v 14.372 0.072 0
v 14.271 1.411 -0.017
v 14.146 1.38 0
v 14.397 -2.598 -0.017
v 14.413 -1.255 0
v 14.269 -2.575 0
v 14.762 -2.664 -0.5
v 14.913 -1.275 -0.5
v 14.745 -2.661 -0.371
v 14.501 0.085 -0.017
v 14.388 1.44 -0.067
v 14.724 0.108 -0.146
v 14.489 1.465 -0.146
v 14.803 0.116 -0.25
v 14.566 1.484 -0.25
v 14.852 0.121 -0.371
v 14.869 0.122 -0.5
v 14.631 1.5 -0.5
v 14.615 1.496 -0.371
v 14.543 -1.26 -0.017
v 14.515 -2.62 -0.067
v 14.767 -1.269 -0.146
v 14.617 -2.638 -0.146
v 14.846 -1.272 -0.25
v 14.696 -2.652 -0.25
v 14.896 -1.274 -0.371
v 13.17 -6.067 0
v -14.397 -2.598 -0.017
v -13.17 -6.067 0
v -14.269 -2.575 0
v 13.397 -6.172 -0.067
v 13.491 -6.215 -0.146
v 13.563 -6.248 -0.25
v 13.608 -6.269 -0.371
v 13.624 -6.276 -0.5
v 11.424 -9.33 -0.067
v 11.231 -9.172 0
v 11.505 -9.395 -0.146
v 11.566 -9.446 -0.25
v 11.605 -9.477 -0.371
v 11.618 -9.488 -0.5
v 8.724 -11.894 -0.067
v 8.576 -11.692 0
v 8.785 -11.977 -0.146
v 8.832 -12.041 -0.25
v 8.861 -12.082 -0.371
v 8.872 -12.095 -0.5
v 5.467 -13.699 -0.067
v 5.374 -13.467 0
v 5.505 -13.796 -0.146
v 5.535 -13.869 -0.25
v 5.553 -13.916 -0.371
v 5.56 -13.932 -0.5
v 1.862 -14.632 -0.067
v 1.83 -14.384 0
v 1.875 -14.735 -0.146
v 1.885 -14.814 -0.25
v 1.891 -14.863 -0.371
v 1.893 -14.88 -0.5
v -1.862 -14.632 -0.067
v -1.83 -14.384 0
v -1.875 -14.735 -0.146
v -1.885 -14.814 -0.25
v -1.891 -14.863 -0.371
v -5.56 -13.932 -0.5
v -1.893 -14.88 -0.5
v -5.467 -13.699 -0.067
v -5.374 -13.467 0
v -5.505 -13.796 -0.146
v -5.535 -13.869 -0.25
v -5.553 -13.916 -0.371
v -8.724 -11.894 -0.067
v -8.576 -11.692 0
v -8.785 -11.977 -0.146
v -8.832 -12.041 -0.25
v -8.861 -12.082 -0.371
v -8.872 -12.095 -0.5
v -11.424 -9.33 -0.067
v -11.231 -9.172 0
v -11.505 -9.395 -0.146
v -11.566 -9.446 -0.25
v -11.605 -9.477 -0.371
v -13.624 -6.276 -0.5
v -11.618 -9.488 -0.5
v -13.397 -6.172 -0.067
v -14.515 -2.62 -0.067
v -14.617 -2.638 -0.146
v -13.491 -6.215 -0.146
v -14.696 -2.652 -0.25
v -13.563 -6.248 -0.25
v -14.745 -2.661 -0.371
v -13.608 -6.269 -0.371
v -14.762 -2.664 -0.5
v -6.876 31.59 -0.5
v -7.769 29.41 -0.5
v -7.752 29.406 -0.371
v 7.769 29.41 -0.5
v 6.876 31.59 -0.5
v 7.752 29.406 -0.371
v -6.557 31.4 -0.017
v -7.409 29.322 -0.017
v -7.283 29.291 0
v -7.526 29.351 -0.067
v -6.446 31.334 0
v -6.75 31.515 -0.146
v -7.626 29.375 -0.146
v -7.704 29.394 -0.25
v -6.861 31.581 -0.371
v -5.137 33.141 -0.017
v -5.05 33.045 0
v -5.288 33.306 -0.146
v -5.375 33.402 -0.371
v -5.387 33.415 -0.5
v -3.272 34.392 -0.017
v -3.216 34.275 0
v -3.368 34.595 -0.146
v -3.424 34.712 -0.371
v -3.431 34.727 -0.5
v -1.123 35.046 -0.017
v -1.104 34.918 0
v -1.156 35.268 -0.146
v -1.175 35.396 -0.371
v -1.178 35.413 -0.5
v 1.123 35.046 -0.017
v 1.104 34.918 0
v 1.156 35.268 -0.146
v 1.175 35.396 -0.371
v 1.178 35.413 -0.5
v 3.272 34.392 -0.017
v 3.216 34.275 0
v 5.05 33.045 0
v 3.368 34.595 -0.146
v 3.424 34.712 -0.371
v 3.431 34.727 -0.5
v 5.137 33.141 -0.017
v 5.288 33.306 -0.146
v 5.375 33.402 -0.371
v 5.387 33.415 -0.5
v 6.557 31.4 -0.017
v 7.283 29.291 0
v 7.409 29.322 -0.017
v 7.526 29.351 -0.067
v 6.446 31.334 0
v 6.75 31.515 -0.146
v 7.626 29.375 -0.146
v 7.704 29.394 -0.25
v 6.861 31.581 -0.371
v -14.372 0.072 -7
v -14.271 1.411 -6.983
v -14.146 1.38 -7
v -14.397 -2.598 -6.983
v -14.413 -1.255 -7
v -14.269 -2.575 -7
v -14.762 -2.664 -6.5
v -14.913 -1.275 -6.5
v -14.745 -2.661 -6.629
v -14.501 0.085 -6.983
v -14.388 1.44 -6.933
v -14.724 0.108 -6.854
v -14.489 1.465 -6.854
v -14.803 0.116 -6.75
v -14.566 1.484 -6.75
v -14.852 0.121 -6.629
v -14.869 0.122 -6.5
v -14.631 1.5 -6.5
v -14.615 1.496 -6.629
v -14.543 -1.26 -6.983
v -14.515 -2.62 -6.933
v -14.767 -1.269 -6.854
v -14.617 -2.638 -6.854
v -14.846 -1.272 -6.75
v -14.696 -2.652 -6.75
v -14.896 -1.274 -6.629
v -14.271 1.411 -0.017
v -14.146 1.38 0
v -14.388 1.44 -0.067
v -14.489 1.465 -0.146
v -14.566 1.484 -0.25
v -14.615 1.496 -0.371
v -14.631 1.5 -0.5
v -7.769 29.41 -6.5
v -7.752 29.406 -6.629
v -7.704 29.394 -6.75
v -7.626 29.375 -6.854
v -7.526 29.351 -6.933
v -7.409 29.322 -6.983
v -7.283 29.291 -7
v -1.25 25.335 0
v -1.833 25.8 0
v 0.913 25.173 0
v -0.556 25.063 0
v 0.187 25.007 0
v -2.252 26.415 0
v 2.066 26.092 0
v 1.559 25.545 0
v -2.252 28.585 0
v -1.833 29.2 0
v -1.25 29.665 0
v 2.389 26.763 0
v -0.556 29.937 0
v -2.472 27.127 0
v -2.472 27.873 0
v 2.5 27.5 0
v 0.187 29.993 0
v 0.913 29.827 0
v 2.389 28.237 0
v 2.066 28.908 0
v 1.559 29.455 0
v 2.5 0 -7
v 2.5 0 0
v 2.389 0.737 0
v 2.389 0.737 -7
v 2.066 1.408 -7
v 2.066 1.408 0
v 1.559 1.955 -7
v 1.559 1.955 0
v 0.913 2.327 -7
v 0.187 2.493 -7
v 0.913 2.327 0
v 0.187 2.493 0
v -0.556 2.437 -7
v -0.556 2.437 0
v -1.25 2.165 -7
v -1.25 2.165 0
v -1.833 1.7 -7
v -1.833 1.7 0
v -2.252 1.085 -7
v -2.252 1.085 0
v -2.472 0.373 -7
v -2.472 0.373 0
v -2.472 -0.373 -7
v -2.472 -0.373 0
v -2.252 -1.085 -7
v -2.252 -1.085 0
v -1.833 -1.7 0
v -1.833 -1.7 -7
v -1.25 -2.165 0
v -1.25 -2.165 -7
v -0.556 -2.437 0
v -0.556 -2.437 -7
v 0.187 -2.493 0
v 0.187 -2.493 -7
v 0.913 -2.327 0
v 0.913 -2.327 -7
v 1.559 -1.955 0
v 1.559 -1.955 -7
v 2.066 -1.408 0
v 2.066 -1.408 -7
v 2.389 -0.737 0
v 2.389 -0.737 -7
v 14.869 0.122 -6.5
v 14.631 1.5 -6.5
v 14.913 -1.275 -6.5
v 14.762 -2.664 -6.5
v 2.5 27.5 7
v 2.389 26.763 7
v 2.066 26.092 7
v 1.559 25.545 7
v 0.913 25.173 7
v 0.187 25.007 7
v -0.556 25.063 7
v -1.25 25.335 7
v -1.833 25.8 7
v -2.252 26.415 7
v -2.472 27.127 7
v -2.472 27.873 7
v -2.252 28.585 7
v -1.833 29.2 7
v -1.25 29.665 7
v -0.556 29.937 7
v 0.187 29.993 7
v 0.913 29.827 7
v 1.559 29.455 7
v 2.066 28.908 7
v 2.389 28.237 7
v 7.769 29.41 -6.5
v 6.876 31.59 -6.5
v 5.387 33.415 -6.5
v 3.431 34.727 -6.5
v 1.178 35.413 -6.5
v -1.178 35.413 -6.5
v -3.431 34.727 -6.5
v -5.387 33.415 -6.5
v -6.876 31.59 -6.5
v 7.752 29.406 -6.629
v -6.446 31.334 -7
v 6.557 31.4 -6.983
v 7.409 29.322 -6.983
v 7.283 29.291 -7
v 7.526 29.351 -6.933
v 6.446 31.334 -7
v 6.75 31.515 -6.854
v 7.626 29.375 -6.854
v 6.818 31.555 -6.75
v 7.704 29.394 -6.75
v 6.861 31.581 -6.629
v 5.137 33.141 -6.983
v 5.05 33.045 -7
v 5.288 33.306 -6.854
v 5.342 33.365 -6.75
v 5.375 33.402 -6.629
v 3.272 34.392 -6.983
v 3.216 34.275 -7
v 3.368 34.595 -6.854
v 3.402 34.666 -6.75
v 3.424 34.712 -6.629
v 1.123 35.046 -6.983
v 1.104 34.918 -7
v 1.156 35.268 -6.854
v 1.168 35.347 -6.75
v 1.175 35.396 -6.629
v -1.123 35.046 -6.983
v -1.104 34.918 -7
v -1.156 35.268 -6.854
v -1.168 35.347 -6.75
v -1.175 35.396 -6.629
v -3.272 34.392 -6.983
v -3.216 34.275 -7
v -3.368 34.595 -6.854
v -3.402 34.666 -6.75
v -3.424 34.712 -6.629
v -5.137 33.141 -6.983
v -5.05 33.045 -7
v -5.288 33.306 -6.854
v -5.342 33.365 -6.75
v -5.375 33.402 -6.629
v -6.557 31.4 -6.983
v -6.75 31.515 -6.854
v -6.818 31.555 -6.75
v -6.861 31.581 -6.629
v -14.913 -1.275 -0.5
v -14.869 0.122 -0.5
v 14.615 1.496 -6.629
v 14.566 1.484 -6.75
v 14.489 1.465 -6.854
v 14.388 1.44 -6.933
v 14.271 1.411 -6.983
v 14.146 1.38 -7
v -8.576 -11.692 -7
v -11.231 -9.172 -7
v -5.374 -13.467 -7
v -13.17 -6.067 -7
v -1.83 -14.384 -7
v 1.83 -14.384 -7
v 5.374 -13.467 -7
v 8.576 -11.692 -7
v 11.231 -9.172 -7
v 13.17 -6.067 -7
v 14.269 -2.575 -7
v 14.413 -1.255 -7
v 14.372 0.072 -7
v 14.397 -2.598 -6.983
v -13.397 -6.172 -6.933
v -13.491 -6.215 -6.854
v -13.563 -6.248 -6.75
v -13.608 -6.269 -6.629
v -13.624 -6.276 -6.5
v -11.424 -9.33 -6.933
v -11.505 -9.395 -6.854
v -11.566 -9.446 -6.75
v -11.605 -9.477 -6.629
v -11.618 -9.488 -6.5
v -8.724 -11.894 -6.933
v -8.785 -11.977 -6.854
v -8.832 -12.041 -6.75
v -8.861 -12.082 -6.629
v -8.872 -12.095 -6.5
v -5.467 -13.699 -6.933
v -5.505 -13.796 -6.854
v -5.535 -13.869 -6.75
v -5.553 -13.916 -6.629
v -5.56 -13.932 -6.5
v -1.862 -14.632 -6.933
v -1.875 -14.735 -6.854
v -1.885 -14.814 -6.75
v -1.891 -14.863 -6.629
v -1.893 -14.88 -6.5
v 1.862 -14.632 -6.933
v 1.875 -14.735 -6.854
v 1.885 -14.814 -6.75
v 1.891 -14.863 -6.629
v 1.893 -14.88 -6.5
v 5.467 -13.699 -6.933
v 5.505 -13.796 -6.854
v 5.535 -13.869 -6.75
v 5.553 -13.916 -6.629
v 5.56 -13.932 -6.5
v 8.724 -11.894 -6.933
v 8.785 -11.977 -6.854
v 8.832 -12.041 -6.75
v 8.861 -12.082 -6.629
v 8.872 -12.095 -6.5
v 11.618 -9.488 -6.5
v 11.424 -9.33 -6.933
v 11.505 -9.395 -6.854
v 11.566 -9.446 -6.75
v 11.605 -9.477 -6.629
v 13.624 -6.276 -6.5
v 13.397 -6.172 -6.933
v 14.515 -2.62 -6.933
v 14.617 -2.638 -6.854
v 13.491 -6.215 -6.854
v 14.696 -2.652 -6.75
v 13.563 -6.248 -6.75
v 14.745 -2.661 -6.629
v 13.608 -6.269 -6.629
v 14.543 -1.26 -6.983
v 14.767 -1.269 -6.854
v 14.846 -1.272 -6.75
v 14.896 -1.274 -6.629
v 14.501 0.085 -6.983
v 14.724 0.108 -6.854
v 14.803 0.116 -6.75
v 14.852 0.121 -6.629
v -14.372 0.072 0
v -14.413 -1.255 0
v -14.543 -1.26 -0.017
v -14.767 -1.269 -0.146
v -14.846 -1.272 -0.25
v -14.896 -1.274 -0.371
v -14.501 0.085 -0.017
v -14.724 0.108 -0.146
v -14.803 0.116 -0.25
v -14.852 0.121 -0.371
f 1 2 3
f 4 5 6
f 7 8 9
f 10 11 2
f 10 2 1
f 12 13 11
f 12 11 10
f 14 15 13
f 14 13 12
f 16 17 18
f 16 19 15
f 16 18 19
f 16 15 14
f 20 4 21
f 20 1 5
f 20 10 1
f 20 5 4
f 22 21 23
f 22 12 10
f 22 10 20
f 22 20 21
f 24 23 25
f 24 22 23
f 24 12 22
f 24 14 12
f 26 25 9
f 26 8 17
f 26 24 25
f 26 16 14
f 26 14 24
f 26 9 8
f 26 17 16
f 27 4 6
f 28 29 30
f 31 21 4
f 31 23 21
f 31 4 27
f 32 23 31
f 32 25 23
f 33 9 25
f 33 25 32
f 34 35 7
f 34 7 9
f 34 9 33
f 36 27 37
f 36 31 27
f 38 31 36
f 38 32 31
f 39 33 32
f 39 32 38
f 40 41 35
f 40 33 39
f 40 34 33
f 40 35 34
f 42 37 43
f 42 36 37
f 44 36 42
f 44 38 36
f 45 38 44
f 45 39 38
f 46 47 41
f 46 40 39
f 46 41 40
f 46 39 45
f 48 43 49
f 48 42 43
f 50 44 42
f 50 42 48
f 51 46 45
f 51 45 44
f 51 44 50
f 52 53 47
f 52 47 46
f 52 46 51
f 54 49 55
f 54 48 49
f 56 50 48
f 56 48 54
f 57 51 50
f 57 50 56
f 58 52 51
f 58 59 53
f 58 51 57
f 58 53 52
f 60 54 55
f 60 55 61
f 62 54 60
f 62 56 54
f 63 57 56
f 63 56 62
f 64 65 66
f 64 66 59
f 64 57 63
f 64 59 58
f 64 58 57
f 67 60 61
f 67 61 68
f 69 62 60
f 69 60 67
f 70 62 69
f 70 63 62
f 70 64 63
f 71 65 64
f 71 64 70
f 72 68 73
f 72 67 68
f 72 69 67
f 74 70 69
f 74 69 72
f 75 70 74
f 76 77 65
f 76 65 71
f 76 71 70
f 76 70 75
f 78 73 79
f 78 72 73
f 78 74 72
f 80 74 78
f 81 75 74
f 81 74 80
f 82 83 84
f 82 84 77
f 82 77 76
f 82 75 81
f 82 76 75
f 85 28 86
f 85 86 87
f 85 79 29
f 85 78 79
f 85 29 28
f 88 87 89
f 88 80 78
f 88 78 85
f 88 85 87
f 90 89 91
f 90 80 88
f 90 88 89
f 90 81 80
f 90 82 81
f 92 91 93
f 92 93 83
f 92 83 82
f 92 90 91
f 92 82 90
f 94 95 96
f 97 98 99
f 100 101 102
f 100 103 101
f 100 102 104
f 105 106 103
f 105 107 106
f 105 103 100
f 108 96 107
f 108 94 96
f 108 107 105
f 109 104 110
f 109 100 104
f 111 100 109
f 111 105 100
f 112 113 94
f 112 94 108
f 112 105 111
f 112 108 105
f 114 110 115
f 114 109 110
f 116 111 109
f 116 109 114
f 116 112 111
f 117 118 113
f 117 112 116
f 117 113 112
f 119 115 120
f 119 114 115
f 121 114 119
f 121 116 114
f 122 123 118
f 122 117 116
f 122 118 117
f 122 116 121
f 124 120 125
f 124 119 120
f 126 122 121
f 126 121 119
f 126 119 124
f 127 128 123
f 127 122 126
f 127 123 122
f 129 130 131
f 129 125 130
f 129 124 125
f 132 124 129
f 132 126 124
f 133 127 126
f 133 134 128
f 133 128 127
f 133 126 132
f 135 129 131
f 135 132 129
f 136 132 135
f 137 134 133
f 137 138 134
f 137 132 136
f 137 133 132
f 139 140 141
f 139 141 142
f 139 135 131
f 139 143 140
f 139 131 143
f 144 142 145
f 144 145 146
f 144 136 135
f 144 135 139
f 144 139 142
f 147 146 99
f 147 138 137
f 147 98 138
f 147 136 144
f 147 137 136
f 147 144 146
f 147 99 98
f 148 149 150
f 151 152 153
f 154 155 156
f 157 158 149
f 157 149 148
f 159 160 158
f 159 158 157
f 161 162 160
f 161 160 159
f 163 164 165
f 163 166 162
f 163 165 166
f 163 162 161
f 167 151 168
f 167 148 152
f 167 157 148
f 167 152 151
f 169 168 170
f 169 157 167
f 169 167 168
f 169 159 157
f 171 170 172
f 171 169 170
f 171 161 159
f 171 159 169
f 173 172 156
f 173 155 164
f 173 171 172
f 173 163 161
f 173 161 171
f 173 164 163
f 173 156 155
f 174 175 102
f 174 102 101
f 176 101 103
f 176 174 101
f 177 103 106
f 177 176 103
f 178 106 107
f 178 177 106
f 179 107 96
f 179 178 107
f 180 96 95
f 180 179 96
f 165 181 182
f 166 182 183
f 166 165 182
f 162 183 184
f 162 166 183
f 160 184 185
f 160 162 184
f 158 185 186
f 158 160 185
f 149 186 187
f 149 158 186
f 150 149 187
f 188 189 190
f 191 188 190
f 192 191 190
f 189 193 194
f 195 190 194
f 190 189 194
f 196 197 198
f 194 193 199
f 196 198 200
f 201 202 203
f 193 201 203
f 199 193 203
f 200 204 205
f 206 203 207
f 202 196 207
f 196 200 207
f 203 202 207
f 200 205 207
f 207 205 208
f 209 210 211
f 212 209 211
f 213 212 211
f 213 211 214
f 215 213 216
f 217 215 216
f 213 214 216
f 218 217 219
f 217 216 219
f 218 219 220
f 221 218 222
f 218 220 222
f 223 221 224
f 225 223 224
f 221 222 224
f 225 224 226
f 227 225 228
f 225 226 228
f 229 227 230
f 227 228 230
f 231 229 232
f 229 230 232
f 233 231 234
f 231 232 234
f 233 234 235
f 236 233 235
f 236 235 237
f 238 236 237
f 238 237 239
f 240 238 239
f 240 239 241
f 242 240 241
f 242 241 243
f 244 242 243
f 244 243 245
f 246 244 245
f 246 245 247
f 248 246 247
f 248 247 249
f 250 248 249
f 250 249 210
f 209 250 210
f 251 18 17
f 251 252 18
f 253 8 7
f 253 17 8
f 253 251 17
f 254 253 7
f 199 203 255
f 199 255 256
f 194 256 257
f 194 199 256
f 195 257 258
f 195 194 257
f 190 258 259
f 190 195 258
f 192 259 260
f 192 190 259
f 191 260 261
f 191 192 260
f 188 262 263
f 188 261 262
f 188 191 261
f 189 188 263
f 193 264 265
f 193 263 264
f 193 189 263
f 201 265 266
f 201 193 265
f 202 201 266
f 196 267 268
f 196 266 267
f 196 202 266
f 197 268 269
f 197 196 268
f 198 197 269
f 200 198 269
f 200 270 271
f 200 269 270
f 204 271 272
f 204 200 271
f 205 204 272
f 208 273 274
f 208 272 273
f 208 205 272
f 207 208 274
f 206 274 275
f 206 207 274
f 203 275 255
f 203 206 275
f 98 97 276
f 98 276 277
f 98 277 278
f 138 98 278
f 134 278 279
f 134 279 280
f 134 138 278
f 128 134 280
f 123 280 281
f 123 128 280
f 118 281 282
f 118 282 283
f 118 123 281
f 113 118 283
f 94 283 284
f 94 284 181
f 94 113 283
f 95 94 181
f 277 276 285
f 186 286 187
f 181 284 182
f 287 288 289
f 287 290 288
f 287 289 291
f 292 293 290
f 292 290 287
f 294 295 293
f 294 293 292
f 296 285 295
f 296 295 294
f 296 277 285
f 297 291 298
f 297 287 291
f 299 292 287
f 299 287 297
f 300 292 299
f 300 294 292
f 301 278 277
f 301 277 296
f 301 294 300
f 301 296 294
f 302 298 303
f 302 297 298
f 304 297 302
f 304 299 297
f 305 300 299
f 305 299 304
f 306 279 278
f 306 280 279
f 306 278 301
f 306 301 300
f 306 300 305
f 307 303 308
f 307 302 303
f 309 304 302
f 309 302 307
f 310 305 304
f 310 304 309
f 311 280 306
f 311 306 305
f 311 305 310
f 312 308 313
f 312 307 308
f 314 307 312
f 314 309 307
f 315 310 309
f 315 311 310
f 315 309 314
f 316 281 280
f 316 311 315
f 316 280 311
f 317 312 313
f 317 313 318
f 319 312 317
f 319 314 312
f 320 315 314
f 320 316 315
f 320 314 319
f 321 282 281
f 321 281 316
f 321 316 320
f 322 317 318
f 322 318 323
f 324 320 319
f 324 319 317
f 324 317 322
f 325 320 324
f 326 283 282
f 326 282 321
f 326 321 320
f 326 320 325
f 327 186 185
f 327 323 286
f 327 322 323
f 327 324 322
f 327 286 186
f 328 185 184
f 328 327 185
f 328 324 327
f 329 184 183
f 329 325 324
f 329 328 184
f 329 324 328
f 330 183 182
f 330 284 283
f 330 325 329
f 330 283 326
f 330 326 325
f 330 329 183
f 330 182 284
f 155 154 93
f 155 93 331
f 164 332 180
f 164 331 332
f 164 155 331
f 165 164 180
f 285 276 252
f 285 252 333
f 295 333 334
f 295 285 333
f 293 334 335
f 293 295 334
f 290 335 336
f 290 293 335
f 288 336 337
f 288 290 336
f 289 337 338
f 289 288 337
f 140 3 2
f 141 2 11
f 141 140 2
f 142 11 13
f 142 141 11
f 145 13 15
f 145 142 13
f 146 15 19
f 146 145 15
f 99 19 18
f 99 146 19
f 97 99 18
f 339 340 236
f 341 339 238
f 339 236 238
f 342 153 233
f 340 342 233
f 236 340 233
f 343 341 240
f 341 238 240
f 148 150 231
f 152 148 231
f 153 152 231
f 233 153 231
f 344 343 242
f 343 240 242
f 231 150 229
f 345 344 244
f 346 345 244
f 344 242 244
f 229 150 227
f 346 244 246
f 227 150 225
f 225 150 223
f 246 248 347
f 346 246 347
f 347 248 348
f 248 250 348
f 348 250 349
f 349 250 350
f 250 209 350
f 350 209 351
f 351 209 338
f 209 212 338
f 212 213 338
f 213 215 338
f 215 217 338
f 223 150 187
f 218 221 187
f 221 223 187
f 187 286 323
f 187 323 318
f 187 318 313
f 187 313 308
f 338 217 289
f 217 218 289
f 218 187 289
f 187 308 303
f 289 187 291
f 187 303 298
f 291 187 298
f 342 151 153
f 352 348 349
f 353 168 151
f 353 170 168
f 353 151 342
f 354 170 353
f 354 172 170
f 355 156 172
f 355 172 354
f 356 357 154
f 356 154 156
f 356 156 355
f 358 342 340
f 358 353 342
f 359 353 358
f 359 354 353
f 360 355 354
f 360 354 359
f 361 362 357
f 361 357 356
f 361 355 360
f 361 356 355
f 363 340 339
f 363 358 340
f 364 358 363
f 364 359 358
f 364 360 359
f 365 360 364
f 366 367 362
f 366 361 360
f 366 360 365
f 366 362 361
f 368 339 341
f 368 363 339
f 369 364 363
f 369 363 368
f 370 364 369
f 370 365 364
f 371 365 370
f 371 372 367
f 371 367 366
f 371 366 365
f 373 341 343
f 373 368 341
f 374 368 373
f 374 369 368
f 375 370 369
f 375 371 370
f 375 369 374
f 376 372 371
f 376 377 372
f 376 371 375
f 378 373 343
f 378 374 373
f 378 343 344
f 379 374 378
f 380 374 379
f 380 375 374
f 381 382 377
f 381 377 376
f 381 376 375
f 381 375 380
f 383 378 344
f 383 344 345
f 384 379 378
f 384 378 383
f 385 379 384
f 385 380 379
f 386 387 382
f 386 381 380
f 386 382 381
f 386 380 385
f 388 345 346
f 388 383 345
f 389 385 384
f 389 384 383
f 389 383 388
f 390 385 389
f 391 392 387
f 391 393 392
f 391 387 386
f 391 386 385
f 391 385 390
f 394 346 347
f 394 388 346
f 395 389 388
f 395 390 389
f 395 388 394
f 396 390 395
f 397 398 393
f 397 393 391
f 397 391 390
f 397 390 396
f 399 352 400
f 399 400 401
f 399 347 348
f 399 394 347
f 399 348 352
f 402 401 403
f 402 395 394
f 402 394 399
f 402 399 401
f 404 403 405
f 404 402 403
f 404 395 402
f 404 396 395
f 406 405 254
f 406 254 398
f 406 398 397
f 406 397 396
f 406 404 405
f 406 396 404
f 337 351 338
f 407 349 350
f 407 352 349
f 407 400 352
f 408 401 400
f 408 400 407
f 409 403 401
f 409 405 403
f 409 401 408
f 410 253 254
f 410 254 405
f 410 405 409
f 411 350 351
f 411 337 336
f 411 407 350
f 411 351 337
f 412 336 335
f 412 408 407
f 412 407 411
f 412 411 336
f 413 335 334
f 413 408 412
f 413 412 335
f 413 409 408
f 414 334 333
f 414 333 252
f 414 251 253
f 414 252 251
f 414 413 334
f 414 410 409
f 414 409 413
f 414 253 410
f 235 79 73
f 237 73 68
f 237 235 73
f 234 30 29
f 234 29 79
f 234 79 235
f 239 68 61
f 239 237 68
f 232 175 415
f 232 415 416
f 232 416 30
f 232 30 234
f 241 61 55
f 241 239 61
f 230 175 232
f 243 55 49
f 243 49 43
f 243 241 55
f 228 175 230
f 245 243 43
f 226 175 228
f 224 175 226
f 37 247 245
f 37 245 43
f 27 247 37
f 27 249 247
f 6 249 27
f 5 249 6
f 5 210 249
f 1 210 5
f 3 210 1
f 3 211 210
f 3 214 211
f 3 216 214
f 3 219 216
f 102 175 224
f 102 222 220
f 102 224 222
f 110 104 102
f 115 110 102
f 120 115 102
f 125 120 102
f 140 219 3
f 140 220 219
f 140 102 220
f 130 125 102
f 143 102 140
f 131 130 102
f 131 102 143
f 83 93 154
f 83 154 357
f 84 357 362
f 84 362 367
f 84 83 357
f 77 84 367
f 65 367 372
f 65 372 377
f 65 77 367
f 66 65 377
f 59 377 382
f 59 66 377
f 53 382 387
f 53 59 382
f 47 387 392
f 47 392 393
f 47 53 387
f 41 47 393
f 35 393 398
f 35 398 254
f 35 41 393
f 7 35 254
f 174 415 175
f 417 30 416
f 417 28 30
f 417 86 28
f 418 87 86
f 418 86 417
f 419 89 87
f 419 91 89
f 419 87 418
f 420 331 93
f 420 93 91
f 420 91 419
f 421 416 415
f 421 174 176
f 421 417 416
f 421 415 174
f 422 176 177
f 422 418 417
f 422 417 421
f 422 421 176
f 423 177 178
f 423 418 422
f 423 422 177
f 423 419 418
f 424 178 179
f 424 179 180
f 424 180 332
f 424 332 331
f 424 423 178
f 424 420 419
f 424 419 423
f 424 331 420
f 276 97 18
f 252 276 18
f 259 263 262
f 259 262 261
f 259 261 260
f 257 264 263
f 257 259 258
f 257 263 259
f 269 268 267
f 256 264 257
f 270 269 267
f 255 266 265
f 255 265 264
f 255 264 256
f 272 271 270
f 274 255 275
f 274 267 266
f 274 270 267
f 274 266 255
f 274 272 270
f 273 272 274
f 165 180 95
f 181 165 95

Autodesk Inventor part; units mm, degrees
ref_plane "YZ Plane" through (0, 0, 0) normal (1, 0, 0) x (0, 1, 0)
ref_plane "XZ Plane" through (0, 0, 0) normal (0, 1, 0) x (-1, 0, 0)
ref_plane "XY Plane" through (0, 0, 0) normal (0, 0, 1) x (1, 0, 0)
sketch "Sketch1" plane through (0, 0, 0) normal (0, 0, 1) x (1, 0, 0)
  line L0 (-15, 0) -> (15, 0) construction
  arc A0 (-15, 0) -> (15, 0) centre (0, 0) ccw
  line L1 (-15, 0) -> (-7.7686, 29.4102)
  arc A1 (7.7686, 29.4102) -> (-7.7686, 29.4102) centre (0, 27.5) ccw
  line L2 (7.7686, 29.4102) -> (15, 0)
  circle A2 centre (0, 0) radius 2.5
  circle A3 centre (0, 27.5) radius 2.5
  dimension "d0" = 8
  dimension "d1" = 15
  dimension "d2" = 27.5
  dimension "d3" = 5
  dimension "d10" = 5
extrude "Extrusion1" add sketch "Sketch1" against normal blind 7 contours L1 A1 L2 A0 | A3
fillet "Fillet1" radius 10 2 edges at (15, 0, -3.5) (-15, 0, -3.5)
fillet "Fillet2" radius 0.5 12 edges at (0, 35.5, 0) (-11.1999, 15.4549, 0) (-14.9156, -0.5754, 0) (0, -15, 0) (14.9156, -0.5754, 0) (11.1999, 15.4549, 0) (14.9156, -0.5754, -7) (0, -15, -7) (-14.9156, -0.5754, -7) (-11.1999, 15.4549, -7) (0, 35.5, -7) (11.1999, 15.4549, -7)
extrude "Extrusion2" add sketch "Sketch1" along normal blind 7 separate body contours A3
properties part number "202 part 1"
